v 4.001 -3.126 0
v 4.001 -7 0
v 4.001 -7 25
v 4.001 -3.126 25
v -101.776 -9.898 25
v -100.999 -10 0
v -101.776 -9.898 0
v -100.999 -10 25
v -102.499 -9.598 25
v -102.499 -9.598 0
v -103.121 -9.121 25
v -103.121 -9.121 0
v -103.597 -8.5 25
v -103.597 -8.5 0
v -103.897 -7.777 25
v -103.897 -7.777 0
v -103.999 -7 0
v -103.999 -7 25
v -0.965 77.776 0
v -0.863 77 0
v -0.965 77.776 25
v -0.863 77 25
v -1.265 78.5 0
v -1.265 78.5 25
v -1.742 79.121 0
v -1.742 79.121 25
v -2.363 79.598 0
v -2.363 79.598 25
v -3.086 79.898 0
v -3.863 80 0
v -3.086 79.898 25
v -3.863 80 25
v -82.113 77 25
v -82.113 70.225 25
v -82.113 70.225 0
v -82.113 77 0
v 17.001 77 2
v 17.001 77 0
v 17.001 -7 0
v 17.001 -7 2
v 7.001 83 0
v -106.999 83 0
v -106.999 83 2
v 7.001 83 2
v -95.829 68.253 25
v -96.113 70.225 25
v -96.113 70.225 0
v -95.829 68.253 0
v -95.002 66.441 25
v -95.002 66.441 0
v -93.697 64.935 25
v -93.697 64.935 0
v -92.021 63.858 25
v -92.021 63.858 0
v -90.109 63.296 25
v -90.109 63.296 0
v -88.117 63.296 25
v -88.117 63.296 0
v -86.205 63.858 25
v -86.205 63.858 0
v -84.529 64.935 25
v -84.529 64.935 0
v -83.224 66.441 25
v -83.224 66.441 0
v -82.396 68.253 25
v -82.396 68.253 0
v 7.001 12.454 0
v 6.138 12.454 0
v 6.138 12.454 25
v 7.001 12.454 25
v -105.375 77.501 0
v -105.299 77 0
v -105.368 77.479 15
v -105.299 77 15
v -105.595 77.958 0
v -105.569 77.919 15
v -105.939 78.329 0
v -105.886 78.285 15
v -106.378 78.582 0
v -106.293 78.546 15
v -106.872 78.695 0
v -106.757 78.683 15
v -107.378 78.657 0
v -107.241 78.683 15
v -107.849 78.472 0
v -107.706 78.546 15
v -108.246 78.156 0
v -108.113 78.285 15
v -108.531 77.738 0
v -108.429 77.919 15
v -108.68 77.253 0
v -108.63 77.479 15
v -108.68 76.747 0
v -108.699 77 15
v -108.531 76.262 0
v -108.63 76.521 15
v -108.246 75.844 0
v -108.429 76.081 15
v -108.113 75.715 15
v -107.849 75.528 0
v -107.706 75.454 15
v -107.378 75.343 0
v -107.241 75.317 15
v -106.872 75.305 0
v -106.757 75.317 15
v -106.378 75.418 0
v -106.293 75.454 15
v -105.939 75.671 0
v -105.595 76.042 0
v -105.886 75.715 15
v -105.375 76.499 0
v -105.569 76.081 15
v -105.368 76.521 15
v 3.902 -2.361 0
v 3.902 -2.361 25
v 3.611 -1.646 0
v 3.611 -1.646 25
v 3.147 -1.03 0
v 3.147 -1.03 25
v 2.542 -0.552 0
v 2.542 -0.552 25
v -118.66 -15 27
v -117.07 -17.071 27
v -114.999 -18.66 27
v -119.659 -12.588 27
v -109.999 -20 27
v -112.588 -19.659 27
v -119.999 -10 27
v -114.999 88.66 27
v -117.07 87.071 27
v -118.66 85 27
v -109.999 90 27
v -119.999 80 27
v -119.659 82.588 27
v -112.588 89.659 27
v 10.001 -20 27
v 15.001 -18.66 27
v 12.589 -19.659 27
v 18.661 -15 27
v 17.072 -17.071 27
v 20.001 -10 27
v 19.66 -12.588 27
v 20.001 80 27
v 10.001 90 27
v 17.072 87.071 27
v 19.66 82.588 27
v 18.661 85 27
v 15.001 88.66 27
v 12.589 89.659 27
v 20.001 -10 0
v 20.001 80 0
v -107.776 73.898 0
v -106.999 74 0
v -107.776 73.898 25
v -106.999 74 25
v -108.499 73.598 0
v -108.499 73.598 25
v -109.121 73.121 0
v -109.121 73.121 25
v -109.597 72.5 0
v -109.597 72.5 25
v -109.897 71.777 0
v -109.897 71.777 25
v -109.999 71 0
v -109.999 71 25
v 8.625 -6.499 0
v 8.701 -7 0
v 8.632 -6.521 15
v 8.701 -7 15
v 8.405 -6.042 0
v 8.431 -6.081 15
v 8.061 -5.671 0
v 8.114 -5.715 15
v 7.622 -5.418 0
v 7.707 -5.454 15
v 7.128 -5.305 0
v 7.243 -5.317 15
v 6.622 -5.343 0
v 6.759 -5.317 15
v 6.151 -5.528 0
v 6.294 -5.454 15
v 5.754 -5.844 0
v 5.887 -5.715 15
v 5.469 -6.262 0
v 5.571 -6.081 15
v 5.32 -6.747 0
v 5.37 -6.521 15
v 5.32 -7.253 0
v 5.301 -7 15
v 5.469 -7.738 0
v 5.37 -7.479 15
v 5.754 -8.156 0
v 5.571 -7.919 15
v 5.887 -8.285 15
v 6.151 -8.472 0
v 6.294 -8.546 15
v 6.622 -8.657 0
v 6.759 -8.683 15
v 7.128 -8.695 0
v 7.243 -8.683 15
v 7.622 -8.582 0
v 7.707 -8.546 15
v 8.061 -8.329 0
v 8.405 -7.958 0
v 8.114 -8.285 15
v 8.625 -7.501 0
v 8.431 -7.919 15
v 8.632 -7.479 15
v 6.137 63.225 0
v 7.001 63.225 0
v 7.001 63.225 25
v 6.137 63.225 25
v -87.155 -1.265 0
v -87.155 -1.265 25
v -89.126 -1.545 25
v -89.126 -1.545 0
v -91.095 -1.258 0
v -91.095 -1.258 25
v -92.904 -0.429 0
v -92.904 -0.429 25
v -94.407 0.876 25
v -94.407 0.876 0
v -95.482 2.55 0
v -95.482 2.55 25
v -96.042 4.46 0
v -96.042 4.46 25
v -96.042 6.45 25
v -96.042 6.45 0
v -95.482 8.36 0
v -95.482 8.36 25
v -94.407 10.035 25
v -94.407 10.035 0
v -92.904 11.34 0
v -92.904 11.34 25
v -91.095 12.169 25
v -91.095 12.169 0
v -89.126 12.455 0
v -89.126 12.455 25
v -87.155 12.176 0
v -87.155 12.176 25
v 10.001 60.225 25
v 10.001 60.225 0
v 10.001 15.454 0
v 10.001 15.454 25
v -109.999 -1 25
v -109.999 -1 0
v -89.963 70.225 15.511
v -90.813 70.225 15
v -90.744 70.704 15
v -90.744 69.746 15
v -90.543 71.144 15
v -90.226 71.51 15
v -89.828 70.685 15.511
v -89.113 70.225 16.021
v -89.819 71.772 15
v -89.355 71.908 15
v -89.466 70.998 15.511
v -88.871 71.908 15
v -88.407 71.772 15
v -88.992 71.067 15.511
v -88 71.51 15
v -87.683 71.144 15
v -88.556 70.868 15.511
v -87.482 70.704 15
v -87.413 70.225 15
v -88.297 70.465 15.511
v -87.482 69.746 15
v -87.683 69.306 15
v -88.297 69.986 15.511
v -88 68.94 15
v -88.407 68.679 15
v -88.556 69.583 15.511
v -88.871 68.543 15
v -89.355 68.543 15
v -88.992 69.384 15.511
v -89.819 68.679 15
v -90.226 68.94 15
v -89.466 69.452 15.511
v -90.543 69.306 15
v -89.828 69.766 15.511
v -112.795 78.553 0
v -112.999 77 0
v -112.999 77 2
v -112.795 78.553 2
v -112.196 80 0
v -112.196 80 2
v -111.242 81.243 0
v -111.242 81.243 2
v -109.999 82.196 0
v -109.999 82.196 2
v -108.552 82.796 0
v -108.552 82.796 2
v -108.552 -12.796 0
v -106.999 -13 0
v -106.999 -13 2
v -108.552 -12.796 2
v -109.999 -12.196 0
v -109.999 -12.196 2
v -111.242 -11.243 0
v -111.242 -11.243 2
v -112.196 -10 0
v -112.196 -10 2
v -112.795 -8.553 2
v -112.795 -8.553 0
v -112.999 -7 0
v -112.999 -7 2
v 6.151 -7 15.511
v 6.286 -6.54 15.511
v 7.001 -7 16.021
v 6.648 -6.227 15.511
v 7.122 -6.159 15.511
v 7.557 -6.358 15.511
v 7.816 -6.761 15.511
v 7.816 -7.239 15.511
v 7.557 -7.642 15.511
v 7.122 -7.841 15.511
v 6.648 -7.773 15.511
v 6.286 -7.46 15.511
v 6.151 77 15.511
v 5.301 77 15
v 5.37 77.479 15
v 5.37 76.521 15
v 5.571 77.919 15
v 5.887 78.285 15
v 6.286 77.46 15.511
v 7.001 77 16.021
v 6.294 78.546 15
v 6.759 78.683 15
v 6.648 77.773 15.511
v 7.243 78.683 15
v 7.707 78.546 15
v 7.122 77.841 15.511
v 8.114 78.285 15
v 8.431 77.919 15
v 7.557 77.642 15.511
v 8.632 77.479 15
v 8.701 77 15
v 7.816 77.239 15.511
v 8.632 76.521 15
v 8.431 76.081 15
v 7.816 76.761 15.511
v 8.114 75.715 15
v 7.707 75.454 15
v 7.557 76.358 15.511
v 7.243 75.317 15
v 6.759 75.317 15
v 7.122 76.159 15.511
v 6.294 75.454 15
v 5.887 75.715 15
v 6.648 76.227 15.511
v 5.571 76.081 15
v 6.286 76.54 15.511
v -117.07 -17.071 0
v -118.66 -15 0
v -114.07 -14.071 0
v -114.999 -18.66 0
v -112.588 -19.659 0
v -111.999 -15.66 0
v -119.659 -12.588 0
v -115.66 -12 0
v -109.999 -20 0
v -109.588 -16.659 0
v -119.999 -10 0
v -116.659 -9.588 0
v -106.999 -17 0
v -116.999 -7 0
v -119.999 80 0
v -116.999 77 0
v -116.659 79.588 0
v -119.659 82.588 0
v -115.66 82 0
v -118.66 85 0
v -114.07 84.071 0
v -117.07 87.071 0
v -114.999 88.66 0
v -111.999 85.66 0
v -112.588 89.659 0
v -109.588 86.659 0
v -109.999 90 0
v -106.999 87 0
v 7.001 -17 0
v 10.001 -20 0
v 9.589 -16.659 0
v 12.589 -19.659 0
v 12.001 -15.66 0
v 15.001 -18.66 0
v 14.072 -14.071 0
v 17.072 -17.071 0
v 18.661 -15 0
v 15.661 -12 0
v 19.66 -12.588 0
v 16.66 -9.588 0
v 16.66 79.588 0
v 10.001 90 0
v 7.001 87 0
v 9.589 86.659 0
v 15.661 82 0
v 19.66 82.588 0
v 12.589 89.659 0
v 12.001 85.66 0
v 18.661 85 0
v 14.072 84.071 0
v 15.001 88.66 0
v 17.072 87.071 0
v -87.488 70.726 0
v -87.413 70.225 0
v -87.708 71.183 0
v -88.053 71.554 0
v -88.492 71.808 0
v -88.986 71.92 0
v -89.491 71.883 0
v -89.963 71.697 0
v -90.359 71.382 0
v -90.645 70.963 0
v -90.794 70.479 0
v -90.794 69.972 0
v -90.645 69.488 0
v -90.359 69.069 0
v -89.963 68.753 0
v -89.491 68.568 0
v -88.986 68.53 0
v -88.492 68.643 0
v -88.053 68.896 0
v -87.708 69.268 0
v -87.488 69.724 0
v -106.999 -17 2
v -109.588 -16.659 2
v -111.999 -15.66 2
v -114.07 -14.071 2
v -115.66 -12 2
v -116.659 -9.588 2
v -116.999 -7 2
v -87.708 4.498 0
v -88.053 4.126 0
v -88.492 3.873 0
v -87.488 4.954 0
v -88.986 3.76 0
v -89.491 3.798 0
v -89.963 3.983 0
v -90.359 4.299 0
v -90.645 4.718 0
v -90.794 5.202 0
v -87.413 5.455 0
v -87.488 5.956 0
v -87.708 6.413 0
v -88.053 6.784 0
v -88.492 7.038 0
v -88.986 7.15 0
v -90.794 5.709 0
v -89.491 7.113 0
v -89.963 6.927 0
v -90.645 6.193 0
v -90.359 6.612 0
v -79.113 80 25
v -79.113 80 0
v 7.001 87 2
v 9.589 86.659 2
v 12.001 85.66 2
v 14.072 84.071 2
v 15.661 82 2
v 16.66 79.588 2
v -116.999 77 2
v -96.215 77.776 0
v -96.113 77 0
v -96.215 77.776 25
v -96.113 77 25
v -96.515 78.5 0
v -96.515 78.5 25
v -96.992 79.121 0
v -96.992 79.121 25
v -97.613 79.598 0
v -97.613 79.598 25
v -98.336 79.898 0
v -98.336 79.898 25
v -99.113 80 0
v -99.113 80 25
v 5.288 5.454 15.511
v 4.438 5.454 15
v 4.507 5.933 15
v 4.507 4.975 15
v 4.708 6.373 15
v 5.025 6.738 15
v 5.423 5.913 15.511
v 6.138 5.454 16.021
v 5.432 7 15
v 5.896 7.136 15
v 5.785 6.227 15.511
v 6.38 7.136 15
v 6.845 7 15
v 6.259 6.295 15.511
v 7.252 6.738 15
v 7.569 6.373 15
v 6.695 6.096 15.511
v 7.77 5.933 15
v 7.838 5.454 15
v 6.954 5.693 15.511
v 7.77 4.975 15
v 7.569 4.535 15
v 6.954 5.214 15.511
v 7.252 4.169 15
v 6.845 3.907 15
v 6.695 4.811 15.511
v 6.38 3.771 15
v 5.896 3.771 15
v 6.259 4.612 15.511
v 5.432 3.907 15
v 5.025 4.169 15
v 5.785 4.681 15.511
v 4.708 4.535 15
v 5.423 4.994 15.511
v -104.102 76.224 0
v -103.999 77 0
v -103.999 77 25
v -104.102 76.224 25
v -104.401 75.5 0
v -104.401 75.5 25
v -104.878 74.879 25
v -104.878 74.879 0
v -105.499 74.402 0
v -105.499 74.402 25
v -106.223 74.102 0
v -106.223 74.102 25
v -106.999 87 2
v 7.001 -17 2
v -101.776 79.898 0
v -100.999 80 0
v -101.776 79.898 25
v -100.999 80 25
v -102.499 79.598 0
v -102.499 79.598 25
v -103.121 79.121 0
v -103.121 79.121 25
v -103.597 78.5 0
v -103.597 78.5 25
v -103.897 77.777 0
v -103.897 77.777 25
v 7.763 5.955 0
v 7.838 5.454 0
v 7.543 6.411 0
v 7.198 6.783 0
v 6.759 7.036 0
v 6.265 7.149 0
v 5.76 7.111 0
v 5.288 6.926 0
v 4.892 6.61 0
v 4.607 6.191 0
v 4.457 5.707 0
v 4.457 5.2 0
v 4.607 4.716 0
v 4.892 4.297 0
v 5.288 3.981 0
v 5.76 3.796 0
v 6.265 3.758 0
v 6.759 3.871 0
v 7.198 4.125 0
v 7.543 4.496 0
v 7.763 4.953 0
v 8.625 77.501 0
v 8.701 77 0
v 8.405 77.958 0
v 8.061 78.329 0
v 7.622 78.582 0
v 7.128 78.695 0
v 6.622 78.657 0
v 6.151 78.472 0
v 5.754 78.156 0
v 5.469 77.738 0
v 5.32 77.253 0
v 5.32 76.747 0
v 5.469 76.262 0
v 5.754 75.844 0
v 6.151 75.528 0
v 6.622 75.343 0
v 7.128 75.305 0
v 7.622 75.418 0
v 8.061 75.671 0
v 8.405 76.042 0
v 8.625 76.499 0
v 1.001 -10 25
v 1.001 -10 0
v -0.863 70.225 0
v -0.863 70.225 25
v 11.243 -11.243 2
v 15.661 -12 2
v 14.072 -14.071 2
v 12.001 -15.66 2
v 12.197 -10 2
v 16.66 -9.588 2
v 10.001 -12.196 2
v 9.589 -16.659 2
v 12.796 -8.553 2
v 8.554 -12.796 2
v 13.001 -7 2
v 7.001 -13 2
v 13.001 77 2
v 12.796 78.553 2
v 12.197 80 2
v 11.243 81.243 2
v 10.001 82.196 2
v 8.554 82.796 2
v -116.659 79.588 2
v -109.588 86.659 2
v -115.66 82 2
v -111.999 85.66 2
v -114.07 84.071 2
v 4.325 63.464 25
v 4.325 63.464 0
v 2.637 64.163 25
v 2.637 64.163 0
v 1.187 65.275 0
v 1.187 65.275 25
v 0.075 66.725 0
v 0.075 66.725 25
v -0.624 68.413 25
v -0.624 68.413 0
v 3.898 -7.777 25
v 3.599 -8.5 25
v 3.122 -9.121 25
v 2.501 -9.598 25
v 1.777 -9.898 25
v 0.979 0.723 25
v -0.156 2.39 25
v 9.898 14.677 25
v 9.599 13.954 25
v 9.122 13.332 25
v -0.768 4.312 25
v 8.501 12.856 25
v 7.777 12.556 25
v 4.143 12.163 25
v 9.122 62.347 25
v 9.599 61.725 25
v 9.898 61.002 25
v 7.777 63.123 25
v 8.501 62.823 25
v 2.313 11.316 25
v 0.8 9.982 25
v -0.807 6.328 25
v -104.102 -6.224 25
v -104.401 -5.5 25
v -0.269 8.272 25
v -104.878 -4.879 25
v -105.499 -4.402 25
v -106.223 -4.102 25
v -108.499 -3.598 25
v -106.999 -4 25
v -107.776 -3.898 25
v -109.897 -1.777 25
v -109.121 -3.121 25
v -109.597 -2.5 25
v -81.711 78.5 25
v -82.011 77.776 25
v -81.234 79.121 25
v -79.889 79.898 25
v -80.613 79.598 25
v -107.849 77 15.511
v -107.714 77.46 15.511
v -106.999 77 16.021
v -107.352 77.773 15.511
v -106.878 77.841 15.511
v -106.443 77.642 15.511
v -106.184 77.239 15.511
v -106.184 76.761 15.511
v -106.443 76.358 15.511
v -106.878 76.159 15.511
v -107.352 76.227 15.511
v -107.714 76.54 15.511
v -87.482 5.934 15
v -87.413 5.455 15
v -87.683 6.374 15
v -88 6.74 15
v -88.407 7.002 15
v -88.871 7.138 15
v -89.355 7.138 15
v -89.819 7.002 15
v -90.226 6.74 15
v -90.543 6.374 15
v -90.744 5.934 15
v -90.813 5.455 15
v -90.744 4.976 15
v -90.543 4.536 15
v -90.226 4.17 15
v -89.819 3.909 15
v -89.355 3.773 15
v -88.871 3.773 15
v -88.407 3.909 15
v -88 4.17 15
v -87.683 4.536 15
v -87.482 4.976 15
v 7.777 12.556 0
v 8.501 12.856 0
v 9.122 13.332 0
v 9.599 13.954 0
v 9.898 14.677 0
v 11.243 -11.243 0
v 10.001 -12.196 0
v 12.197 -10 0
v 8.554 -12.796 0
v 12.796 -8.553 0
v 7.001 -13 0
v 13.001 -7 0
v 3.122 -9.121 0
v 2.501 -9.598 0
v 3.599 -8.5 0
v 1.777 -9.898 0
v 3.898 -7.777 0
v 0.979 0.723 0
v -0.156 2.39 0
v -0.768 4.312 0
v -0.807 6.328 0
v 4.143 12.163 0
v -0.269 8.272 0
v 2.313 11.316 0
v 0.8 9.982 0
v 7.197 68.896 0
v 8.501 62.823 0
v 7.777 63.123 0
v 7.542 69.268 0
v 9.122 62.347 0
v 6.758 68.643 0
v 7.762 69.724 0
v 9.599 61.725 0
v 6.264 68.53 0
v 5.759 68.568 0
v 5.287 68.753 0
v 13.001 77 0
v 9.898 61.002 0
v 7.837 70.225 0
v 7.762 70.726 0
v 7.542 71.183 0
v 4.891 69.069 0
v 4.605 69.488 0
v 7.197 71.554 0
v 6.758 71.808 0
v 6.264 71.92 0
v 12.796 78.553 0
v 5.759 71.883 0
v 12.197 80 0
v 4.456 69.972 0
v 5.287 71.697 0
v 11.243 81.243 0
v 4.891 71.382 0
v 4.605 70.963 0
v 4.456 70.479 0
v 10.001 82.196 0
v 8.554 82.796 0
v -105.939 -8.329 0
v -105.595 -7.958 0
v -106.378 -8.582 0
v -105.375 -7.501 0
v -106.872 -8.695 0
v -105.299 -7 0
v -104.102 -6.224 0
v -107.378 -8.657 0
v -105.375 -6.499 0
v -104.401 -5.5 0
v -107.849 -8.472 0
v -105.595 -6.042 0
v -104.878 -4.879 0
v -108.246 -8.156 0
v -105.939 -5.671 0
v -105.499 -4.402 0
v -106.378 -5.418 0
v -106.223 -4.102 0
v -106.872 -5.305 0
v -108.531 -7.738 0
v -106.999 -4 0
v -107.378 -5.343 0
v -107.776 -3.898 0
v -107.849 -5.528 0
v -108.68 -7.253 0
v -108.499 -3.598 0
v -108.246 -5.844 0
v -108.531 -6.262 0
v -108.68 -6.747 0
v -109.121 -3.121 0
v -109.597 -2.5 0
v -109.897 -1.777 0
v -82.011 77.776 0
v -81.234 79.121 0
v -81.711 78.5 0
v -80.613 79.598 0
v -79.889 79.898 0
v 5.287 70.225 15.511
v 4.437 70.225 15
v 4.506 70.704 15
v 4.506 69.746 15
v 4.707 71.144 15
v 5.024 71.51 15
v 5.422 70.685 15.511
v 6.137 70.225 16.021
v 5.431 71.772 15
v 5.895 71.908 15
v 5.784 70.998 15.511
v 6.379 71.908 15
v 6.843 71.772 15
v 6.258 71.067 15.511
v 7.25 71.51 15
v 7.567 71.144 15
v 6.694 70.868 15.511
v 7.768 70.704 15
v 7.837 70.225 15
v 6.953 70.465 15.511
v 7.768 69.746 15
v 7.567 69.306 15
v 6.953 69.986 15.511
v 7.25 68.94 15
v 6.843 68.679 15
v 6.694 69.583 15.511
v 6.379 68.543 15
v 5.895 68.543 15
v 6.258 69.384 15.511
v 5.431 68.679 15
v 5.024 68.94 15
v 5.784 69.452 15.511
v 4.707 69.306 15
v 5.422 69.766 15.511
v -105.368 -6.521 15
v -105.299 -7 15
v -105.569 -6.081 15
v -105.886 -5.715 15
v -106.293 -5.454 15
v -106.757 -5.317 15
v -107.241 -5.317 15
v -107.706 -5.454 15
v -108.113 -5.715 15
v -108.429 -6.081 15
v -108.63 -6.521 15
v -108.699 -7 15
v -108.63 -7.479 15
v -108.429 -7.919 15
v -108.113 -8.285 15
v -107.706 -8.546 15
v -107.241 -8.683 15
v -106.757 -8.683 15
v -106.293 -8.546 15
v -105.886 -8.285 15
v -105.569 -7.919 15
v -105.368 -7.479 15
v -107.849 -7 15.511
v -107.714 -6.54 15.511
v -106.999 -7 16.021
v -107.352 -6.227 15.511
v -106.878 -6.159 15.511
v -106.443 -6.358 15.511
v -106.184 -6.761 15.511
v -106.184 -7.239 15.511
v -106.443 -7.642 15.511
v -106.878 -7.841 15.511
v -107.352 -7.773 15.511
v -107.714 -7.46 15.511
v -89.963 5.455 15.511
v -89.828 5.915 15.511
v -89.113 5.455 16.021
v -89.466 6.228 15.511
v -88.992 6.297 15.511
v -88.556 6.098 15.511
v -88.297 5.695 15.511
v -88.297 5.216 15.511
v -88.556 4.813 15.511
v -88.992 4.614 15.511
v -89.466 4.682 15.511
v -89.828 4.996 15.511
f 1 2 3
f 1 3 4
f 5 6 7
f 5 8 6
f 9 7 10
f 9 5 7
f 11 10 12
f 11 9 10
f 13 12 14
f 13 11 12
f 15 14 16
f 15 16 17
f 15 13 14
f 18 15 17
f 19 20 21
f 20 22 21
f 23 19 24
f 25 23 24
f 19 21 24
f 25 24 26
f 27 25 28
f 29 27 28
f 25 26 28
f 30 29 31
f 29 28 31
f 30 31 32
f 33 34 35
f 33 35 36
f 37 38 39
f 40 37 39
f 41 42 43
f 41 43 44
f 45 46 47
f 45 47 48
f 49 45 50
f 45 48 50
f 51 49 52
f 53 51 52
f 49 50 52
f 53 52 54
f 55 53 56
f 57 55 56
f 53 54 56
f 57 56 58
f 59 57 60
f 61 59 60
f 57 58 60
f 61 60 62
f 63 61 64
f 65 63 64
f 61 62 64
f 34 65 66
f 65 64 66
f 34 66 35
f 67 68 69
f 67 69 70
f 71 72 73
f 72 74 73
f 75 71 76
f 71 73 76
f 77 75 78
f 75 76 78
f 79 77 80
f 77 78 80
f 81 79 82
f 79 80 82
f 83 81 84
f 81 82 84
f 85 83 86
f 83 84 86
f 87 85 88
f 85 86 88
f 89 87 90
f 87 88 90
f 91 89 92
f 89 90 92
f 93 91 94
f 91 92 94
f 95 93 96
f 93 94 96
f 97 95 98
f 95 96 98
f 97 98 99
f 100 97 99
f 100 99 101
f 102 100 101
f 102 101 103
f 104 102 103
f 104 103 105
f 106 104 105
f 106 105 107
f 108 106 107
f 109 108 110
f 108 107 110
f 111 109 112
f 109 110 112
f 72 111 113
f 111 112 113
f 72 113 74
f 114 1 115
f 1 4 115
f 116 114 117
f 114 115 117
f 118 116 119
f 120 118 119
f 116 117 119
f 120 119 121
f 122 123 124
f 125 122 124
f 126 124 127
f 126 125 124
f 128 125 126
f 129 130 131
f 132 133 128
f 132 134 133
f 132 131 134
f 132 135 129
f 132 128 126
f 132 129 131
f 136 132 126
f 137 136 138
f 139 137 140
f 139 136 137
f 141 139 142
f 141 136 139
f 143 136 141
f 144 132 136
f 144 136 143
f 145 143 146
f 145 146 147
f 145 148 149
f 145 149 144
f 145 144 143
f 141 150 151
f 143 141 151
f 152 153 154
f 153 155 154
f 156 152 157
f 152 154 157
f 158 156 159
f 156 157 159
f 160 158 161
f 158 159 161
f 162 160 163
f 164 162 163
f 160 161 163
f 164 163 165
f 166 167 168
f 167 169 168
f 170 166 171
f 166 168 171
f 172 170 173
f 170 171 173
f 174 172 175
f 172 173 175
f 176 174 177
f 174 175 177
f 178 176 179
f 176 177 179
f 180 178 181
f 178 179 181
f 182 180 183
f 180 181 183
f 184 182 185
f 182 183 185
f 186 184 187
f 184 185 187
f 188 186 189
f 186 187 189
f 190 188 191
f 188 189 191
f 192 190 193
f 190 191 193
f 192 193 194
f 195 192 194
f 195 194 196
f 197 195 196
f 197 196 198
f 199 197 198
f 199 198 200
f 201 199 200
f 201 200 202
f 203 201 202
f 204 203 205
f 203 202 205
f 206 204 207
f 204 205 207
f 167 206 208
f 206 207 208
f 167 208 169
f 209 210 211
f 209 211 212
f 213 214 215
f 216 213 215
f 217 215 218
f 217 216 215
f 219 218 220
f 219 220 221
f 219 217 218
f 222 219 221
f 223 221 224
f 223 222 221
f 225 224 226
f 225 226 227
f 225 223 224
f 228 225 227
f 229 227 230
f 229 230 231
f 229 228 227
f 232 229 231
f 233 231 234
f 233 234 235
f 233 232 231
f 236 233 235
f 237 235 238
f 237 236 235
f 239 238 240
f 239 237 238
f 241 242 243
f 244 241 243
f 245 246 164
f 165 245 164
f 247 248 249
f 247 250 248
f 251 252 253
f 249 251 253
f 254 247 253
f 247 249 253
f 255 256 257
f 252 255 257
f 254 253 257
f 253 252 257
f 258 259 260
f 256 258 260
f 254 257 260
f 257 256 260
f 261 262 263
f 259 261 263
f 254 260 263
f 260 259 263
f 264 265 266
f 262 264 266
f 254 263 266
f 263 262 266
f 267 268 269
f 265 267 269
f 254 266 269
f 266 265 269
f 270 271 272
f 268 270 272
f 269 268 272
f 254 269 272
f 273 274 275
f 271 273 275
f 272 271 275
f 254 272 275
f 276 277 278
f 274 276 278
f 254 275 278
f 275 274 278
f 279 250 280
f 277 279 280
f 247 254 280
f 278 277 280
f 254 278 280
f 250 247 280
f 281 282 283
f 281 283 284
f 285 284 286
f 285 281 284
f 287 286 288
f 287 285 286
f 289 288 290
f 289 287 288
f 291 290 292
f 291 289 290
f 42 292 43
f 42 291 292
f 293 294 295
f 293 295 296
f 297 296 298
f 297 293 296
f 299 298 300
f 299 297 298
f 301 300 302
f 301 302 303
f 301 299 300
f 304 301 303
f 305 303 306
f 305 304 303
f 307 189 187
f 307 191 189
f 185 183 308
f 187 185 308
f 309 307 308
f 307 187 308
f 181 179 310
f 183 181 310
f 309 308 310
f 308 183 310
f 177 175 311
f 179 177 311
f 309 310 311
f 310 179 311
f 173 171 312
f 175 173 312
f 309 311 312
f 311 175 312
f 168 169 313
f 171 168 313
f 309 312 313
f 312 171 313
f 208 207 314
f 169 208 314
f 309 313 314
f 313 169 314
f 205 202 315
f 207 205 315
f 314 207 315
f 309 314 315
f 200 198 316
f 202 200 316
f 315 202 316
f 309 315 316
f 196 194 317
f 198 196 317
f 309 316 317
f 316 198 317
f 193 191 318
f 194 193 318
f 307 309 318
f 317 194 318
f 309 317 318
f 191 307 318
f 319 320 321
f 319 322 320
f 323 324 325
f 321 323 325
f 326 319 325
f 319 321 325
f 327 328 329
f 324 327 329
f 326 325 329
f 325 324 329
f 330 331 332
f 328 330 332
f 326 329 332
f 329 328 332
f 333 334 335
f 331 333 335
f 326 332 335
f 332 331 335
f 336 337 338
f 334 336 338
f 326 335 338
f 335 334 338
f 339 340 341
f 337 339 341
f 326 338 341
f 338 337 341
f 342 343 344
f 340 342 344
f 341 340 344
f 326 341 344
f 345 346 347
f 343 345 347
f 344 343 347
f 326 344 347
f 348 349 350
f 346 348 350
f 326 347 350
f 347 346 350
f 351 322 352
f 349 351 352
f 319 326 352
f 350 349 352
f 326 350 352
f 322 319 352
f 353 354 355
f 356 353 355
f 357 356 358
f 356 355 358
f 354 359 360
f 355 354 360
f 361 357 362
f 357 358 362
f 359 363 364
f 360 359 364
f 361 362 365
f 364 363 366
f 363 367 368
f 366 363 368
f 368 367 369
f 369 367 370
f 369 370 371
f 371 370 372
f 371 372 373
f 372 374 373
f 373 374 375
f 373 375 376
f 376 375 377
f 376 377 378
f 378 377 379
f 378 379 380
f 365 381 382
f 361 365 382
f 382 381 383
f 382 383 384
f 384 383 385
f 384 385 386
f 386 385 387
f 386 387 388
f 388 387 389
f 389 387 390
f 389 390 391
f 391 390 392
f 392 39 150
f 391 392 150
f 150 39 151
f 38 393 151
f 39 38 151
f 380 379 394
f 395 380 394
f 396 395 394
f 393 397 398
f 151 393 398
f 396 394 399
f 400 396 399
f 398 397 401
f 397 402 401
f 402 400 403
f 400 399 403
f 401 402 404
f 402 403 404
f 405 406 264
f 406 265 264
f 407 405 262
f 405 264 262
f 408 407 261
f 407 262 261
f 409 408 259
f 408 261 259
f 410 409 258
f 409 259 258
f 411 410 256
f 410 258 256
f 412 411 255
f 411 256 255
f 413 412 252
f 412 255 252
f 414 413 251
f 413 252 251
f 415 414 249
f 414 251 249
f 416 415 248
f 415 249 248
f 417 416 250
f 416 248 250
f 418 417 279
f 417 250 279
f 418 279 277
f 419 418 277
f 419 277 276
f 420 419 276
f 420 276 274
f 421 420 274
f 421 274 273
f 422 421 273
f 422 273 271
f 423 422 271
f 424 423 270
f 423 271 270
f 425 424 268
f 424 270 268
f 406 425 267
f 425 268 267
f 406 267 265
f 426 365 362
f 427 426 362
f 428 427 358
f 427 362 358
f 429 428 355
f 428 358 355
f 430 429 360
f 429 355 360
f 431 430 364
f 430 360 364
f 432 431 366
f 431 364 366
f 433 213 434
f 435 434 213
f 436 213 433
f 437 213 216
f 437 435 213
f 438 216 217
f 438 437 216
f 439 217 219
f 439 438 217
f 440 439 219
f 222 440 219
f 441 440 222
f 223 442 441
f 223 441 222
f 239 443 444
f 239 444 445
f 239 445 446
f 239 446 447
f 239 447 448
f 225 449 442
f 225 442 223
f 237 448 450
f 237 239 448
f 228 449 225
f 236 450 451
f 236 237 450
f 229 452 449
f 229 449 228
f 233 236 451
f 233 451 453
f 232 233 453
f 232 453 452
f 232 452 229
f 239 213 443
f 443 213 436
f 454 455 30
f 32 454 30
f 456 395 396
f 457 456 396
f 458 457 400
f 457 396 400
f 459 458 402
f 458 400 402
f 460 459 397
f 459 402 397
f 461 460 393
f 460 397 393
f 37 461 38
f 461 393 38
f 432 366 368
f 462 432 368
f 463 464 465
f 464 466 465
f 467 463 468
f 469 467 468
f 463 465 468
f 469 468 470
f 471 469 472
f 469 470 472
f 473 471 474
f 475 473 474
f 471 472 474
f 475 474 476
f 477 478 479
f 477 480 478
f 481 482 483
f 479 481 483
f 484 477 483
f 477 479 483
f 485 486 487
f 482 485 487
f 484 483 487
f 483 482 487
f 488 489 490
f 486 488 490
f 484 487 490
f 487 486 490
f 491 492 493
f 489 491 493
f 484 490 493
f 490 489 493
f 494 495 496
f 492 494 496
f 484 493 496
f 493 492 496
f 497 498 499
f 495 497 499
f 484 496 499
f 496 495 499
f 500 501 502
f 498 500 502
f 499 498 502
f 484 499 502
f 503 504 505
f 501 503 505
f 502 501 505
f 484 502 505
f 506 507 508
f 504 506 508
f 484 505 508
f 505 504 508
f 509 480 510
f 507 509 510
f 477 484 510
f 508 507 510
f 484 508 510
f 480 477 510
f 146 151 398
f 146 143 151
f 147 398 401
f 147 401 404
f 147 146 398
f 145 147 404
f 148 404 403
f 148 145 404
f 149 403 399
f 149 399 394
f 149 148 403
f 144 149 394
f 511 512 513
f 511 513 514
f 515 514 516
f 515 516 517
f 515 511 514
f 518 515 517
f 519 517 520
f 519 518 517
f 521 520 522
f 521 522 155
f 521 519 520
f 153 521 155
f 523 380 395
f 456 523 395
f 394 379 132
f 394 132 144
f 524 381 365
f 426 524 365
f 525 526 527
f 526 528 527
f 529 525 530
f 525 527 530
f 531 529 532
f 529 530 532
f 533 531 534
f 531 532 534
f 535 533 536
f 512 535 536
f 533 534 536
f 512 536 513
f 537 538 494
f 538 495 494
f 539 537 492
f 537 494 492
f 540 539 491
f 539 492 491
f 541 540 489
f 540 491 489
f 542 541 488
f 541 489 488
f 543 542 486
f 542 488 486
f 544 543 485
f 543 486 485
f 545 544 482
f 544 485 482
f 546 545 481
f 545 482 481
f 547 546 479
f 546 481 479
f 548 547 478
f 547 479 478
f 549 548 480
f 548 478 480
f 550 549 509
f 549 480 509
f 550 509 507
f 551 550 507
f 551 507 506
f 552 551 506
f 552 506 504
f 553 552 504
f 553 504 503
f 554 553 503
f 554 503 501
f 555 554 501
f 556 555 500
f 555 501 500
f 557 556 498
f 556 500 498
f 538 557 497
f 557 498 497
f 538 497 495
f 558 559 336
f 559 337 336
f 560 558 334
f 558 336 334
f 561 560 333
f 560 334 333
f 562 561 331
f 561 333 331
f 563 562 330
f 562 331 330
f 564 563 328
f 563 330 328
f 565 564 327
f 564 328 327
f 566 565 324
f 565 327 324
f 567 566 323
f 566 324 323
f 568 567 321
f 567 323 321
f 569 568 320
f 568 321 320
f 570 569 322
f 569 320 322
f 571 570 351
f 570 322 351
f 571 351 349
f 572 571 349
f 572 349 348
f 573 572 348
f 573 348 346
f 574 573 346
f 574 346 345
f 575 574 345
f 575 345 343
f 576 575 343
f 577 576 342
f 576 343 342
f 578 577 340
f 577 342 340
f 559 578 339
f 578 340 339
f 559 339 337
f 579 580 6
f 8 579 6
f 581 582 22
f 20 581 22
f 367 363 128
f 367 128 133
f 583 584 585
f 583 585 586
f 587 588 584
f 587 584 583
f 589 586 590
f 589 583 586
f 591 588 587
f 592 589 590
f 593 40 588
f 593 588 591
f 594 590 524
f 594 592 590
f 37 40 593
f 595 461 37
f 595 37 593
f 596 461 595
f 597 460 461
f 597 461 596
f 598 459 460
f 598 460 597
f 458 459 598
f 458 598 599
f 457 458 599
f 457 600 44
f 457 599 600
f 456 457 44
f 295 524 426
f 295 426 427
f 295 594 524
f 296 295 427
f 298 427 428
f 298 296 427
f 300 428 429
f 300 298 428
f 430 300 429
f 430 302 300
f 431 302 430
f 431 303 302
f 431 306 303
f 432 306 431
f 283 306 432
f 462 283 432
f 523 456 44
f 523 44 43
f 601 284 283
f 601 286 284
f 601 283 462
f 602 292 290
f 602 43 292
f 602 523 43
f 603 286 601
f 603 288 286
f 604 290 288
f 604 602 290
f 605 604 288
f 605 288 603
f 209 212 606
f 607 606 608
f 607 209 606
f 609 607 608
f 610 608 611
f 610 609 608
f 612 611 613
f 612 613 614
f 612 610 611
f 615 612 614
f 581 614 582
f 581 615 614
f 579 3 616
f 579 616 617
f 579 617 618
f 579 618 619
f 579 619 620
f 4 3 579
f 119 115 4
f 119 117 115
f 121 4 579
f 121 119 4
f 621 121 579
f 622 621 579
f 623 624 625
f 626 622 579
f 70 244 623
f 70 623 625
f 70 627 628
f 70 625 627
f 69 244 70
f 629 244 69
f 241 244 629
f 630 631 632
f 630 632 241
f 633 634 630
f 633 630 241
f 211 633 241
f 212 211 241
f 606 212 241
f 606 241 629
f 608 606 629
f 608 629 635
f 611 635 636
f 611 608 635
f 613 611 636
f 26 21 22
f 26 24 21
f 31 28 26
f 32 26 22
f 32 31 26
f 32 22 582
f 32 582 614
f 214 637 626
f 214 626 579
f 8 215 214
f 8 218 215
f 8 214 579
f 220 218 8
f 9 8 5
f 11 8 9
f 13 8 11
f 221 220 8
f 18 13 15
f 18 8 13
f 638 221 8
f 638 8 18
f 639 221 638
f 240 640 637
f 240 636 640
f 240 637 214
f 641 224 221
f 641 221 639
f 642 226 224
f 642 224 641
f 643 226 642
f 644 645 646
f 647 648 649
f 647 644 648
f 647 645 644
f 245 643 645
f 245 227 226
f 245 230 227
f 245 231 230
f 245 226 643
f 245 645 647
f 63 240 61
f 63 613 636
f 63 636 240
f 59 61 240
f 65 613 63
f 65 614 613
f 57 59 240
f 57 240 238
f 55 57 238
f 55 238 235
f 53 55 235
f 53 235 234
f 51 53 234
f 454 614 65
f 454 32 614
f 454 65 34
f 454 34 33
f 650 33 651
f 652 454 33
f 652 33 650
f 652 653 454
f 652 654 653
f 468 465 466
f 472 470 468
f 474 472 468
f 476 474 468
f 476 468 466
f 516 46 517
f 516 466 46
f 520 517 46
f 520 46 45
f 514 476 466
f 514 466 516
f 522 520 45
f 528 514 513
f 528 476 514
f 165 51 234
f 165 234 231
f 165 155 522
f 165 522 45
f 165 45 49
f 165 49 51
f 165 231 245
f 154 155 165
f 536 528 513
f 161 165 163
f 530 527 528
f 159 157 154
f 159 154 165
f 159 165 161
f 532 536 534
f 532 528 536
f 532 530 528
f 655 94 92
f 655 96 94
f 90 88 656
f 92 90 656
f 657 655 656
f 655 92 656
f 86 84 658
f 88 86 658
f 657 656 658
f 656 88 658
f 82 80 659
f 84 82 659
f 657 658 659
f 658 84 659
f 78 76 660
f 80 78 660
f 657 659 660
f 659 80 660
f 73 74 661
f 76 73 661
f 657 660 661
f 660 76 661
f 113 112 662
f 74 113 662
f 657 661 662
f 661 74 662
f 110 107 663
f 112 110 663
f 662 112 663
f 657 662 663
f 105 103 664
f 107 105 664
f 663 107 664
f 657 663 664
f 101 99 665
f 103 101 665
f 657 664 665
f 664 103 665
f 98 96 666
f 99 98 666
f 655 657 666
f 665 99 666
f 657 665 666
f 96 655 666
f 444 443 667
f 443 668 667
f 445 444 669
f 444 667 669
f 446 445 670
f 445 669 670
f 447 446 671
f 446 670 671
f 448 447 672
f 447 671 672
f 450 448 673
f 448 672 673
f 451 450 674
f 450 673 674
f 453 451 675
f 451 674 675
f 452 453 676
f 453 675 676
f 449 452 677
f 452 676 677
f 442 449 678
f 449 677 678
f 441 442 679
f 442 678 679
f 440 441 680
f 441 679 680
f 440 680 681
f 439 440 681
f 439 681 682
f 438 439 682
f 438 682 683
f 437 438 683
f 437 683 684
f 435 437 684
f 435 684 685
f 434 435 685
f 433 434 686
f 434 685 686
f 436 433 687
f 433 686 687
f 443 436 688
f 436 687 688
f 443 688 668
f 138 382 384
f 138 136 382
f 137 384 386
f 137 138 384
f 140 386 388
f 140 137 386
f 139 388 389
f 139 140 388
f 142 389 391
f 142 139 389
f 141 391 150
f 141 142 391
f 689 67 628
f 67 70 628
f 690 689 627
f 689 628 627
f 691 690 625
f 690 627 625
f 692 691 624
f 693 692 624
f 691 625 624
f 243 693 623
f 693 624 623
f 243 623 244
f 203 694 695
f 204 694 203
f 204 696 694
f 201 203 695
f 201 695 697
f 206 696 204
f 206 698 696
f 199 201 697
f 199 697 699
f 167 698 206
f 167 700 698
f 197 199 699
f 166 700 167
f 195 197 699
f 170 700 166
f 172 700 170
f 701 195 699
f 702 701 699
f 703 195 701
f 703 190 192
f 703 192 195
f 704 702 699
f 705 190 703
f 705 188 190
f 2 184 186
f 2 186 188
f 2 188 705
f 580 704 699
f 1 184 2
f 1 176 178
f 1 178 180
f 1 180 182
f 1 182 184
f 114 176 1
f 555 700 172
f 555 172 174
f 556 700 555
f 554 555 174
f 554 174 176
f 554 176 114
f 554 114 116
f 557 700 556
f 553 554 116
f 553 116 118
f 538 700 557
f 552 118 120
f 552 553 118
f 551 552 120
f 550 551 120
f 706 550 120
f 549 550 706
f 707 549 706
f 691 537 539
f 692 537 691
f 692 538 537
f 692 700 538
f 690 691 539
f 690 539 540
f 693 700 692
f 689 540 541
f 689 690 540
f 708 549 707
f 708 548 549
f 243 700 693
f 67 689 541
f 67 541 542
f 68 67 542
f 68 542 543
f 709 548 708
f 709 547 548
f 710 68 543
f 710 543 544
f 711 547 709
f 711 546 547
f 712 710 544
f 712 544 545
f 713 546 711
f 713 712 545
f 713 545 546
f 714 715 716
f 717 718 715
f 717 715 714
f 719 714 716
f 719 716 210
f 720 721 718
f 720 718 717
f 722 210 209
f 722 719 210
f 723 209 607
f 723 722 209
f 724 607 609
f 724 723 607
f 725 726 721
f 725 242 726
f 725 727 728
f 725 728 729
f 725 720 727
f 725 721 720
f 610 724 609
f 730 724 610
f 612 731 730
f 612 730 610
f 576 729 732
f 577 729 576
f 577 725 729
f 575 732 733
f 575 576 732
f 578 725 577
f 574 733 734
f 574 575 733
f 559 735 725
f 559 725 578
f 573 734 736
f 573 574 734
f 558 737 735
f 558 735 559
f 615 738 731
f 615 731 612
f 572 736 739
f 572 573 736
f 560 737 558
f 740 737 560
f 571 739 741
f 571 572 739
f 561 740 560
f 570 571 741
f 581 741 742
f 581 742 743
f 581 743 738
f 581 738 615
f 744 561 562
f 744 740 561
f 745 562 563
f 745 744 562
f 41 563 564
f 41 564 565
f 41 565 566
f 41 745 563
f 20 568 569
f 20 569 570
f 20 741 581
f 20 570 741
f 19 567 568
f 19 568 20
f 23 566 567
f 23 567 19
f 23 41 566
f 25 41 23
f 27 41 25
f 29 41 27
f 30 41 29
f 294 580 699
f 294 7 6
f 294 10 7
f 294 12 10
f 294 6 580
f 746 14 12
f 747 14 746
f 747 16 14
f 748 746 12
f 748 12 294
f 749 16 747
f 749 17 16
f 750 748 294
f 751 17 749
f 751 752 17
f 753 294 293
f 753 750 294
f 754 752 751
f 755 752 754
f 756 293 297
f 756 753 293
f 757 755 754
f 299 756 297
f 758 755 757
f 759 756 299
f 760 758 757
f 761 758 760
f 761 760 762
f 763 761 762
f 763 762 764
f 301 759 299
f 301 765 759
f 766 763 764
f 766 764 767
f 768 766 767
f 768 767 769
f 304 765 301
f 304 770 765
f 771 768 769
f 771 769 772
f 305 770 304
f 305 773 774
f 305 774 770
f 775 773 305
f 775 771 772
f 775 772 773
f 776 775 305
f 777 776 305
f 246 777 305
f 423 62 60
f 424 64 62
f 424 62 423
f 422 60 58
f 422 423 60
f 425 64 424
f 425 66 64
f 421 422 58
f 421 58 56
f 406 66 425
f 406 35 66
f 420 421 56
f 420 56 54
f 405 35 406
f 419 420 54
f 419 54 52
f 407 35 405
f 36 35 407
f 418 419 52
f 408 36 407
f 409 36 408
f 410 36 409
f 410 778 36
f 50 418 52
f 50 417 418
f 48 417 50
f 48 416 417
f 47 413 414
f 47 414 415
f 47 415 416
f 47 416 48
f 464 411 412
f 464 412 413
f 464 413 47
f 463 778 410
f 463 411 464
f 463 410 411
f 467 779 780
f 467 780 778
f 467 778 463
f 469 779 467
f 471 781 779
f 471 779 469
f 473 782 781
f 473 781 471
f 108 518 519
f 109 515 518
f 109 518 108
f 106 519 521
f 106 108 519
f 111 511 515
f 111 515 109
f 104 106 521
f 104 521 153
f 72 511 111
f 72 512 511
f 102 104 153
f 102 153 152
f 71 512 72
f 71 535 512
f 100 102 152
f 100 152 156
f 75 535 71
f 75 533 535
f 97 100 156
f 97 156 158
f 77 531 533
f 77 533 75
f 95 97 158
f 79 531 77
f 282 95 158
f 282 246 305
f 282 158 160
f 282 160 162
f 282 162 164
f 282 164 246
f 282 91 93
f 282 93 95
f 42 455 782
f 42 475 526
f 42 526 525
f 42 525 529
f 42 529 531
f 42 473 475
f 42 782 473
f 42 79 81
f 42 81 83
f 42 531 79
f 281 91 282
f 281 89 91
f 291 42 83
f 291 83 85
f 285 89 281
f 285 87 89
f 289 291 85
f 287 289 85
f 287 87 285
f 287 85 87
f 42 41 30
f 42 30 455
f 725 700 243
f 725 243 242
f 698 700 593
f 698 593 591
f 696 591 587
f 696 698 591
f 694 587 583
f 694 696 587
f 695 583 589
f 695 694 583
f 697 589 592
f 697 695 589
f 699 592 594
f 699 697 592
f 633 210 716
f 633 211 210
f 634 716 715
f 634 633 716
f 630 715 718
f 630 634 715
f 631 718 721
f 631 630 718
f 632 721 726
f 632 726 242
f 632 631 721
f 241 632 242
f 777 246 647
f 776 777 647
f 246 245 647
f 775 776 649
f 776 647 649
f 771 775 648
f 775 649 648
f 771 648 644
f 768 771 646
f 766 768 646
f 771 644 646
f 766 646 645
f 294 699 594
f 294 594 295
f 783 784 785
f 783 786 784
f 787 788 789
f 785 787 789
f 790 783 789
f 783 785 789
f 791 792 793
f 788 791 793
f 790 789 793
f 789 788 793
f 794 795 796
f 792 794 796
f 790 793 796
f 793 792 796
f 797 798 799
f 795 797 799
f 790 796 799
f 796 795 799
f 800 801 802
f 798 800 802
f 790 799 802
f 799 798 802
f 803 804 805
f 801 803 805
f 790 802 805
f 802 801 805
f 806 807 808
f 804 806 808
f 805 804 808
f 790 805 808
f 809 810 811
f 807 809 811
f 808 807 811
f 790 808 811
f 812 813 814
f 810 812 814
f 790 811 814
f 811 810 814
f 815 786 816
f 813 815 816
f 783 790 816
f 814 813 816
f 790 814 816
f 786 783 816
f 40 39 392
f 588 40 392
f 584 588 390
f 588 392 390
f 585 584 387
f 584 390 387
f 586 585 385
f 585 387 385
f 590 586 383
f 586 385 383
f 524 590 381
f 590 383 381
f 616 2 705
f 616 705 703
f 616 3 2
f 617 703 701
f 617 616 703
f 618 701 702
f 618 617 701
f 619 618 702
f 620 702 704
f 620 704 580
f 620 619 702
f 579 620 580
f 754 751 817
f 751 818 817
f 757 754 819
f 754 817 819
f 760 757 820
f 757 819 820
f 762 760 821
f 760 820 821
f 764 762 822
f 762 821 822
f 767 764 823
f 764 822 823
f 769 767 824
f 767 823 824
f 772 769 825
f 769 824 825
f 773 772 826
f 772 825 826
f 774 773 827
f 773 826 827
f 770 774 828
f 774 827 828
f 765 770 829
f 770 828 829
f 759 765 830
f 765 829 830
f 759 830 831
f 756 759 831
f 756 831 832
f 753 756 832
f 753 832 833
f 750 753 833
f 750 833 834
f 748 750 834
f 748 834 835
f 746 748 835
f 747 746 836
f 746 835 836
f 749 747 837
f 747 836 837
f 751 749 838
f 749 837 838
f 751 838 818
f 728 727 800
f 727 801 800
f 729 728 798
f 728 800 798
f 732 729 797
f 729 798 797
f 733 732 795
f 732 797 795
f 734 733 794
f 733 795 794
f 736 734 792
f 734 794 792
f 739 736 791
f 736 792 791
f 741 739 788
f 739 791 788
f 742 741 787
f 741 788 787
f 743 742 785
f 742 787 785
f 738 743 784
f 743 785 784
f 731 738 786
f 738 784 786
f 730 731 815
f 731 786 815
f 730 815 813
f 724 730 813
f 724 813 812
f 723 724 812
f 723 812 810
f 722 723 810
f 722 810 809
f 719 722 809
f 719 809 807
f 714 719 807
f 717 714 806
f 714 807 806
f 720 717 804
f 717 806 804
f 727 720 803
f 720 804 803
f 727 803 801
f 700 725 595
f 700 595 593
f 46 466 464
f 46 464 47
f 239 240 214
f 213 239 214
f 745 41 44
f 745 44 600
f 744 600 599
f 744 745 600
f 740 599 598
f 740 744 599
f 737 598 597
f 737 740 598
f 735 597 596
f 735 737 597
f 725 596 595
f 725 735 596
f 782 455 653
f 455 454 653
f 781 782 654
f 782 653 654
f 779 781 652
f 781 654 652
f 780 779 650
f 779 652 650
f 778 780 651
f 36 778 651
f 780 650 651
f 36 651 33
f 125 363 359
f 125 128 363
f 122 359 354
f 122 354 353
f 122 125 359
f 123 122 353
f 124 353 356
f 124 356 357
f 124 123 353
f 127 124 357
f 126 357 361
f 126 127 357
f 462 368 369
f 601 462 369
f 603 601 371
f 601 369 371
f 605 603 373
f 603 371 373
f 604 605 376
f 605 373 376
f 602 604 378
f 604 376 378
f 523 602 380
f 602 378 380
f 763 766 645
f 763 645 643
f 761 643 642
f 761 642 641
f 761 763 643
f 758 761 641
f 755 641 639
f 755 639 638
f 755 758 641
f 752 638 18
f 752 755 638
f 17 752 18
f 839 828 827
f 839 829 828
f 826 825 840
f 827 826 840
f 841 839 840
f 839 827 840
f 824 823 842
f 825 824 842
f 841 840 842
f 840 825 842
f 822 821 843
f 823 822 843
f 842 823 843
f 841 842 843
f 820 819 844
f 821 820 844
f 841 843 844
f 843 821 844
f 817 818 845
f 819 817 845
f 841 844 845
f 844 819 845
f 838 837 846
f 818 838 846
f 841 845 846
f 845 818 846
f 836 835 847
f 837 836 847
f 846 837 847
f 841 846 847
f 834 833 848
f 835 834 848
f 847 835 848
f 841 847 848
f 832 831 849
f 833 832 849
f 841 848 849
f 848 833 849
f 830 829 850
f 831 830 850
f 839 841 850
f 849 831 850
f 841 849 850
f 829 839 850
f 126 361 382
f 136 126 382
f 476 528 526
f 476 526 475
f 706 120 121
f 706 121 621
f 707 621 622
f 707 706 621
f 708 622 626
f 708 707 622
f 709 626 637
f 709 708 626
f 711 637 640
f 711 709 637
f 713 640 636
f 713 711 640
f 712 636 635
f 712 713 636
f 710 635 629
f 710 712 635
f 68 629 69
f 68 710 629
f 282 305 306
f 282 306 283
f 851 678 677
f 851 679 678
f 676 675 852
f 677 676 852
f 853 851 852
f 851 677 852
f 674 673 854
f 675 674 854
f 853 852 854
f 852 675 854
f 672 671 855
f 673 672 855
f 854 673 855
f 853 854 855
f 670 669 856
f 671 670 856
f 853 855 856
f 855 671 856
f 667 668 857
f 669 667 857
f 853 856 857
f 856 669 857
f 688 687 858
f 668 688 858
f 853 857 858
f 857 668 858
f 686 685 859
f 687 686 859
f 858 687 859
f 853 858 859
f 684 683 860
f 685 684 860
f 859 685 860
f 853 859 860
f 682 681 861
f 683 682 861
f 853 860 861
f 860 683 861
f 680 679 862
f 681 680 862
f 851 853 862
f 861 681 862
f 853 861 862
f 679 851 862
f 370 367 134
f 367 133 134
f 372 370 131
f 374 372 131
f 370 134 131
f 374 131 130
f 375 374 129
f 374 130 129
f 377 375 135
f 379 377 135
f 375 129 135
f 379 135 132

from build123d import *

# Parameters (mm, degrees)
SKETCH1_W                = 140
SKETCH1_H                = 110
BOSS_EXTRUDE1_DEPTH      = 27
FILLET1_R                = 10
CUT_EXTRUDE1_DEPTH       = 25
CUT_EXTRUDE2_DEPTH       = 2
BOSS_EXTRUDE2_START      = 25
BOSS_EXTRUDE2_DEPTH      = 25
FILLET2_R                = 3
M3_CLEARANCE_HOLE1_D     = 3.4
M3_CLEARANCE_HOLE1_DEPTH = 15
M3_CLEARANCE_HOLE1_TIP   = 1.021463052
FILLET3_R                = 3


with BuildPart() as part:
    # Sketch1 → Boss-Extrude1 (new body)
    with BuildSketch(Plane.XY):
        with Locations((-49.99935, 35)):
            Rectangle(SKETCH1_W, SKETCH1_H)
    extrude(amount=BOSS_EXTRUDE1_DEPTH)

    # Fillet1
    fillet1_edges = [part.edges().sort_by_distance(p)[0] for p in [
        (20.00065, -20, 13.5),
        (-119.99935, -20, 13.5),
        (-119.99935, 90, 13.5),
        (20.00065, 90, 13.5),
    ]]
    fillet(fillet1_edges, radius=FILLET1_R)

    # Sketch3 → Cut-Extrude1 (cut)
    with BuildSketch(Plane(origin=(0, 0, 0), x_dir=(-1, 0, 0), z_dir=(0, 0, -1))):
        with BuildLine():
            Line((106.99935, 80), (-7.00065, 80))
            ThreePointArc((-7.00065, 80), (-9.121970344, 79.121320344), (-10.00065, 77))
            Line((-10.00065, 77), (-10.00065, -7))
            ThreePointArc((-10.00065, -7), (-9.121970344, -9.121320344), (-7.00065, -10))
            Line((-7.00065, -10), (106.99935, -10))
            ThreePointArc((106.99935, -10), (109.120670344, -9.121320344), (109.99935, -7))
            Line((109.99935, -7), (109.99935, 77))
            ThreePointArc((109.99935, 77), (109.120670344, 79.121320344), (106.99935, 80))
        make_face()
    extrude(amount=-CUT_EXTRUDE1_DEPTH, mode=Mode.SUBTRACT)

    # Sketch5 → Cut-Extrude2 (cut)
    with BuildSketch(Plane(origin=(0, 0, 0), x_dir=(-1, 0, 0), z_dir=(0, 0, -1))):
        with BuildLine():
            Line((-7.00065, -17), (106.99935, -17))
            ThreePointArc((106.99935, -17), (114.070417812, -14.071067812), (116.99935, -7))
            Line((116.99935, -7), (116.99935, 77))
            ThreePointArc((116.99935, 77), (114.070417812, 84.071067812), (106.99935, 87))
            Line((106.99935, 87), (-7.00065, 87))
            ThreePointArc((-7.00065, 87), (-14.071717812, 84.071067812), (-17.00065, 77))
            Line((-17.00065, 77), (-17.00065, -7))
            ThreePointArc((-17.00065, -7), (-14.071717812, -14.071067812), (-7.00065, -17))
        make_face()
        with BuildLine():
            Line((-7.00065, -13), (106.99935, -13))
            ThreePointArc((106.99935, -13), (111.241990687, -11.242640687), (112.99935, -7))
            Line((112.99935, -7), (112.99935, 77))
            ThreePointArc((112.99935, 77), (111.241990687, 81.242640687), (106.99935, 83))
            Line((106.99935, 83), (-7.00065, 83))
            ThreePointArc((-7.00065, 83), (-11.243290687, 81.242640687), (-13.00065, 77))
            Line((-13.00065, 77), (-13.00065, -7))
            ThreePointArc((-13.00065, -7), (-11.243290687, -11.242640687), (-7.00065, -13))
        make_face(mode=Mode.SUBTRACT)
    extrude(amount=-CUT_EXTRUDE2_DEPTH, mode=Mode.SUBTRACT)

    # Sketch6 → Boss-Extrude2 (add)
    with BuildSketch(Plane(origin=(0, 0, 25), x_dir=(-1, 0, 0), z_dir=(0, 0, -1)).offset(BOSS_EXTRUDE2_START)):
        with BuildLine():
            Line((0.862925656, 70.225224344), (0.862925656, 80))
            Line((0.862925656, 80), (-7.00065, 80))
            ThreePointArc((-7.00065, 80), (-9.121970344, 79.121320344), (-10.00065, 77))
            Line((-10.00065, 77), (-10.00065, 63.225224344))
            Line((-10.00065, 63.225224344), (-6.137074344, 63.225224344))
            ThreePointArc((-6.137074344, 63.225224344), (-1.187326876, 65.275476876), (0.862925656, 70.225224344))
        make_face()
        with BuildLine():
            Line((82.112925656, 70.225224344), (82.112925656, 80))
            Line((82.112925656, 80), (96.112925656, 80))
            Line((96.112925656, 80), (96.112925656, 70.225224344))
            ThreePointArc((96.112925656, 70.225224344), (89.112925656, 63.225224344), (82.112925656, 70.225224344))
        make_face()
        with BuildLine():
            Line((-10.00065, 12.453724344), (-10.00065, -1.546275656))
            Line((-10.00065, -1.546275656), (-10.00065, -7))
            ThreePointArc((-10.00065, -7), (-9.121970344, -9.121320344), (-7.00065, -10))
            Line((-7.00065, -10), (-4.00065, -10))
            Line((-4.00065, -10), (-4.00065, -1.211868999))
            ThreePointArc((-4.00065, -1.211868999), (0.777518707, 6.535585378), (-6.138374344, 12.453724344))
            Line((-6.138374344, 12.453724344), (-10.00065, 12.453724344))
        make_face()
        with BuildLine():
            Line((87.155325656, 12.175923879), (87.155325656, -1.265475191))
            ThreePointArc((87.155325656, -1.265475191), (96.112925656, 5.455224344), (87.155325656, 12.175923879))
        make_face()
        with BuildLine():
            Line((106.99935, 74), (109.99935, 74))
            Line((109.99935, 74), (109.99935, 77))
            ThreePointArc((109.99935, 77), (109.120670344, 79.121320344), (106.99935, 80))
            Line((106.99935, 80), (103.99935, 80))
            Line((103.99935, 80), (103.99935, 77))
            ThreePointArc((103.99935, 77), (104.878029656, 74.878679656), (106.99935, 74))
        make_face()
        with BuildLine():
            Line((103.99935, -7), (103.99935, -10))
            Line((103.99935, -10), (106.99935, -10))
            ThreePointArc((106.99935, -10), (109.120670344, -9.121320344), (109.99935, -7))
            Line((109.99935, -7), (109.99935, -4))
            Line((109.99935, -4), (106.99935, -4))
            ThreePointArc((106.99935, -4), (104.878029656, -4.878679656), (103.99935, -7))
        make_face()
    extrude(amount=-BOSS_EXTRUDE2_DEPTH)

    # Fillet2
    fillet2_edges = [part.edges().sort_by_distance(p)[0] for p in [
        (-0.862925656, 80, 12.5),
        (10.00065, 63.225224344, 12.5),
        (-96.112925656, 80, 12.5),
        (-82.112925656, 80, 12.5),
        (4.00065, -1.211868999, 12.5),
        (10.00065, 12.453724344, 12.5),
    ]]
    fillet(fillet2_edges, radius=FILLET2_R)

    # M3 Clearance Hole1
    with Locations(Plane(origin=(0, 0, 0), x_dir=(-1, 0, 0), z_dir=(0, 0, -1))):
        with Locations((-6.137074344, 70.225224344), (89.112925656, 70.225224344), (89.112925656, 5.455224344), (-6.138374344, 5.453724344), (-7.00065, 77), (106.99935, 77), (106.99935, -7), (-7.00065, -7)):
            Hole(M3_CLEARANCE_HOLE1_D / 2, depth=M3_CLEARANCE_HOLE1_DEPTH)
            with Locations((0, 0, -(M3_CLEARANCE_HOLE1_DEPTH + M3_CLEARANCE_HOLE1_TIP / 2))):  # 118° drill point
                Cone(0, M3_CLEARANCE_HOLE1_D / 2, M3_CLEARANCE_HOLE1_TIP, mode=Mode.SUBTRACT)

    # Fillet3
    fillet3_edges = [part.edges().sort_by_distance(p)[0] for p in [
        (-109.99935, 74, 12.5),
        (-103.99935, 80, 12.5),
        (-109.99935, -4, 12.5),
        (-103.99935, -10, 12.5),
        (4.00065, -10, 12.5),
    ]]
    fillet(fillet3_edges, radius=FILLET3_R - 0.0001)  # a hair under: the kernel refuses the full size


solid = part.part
